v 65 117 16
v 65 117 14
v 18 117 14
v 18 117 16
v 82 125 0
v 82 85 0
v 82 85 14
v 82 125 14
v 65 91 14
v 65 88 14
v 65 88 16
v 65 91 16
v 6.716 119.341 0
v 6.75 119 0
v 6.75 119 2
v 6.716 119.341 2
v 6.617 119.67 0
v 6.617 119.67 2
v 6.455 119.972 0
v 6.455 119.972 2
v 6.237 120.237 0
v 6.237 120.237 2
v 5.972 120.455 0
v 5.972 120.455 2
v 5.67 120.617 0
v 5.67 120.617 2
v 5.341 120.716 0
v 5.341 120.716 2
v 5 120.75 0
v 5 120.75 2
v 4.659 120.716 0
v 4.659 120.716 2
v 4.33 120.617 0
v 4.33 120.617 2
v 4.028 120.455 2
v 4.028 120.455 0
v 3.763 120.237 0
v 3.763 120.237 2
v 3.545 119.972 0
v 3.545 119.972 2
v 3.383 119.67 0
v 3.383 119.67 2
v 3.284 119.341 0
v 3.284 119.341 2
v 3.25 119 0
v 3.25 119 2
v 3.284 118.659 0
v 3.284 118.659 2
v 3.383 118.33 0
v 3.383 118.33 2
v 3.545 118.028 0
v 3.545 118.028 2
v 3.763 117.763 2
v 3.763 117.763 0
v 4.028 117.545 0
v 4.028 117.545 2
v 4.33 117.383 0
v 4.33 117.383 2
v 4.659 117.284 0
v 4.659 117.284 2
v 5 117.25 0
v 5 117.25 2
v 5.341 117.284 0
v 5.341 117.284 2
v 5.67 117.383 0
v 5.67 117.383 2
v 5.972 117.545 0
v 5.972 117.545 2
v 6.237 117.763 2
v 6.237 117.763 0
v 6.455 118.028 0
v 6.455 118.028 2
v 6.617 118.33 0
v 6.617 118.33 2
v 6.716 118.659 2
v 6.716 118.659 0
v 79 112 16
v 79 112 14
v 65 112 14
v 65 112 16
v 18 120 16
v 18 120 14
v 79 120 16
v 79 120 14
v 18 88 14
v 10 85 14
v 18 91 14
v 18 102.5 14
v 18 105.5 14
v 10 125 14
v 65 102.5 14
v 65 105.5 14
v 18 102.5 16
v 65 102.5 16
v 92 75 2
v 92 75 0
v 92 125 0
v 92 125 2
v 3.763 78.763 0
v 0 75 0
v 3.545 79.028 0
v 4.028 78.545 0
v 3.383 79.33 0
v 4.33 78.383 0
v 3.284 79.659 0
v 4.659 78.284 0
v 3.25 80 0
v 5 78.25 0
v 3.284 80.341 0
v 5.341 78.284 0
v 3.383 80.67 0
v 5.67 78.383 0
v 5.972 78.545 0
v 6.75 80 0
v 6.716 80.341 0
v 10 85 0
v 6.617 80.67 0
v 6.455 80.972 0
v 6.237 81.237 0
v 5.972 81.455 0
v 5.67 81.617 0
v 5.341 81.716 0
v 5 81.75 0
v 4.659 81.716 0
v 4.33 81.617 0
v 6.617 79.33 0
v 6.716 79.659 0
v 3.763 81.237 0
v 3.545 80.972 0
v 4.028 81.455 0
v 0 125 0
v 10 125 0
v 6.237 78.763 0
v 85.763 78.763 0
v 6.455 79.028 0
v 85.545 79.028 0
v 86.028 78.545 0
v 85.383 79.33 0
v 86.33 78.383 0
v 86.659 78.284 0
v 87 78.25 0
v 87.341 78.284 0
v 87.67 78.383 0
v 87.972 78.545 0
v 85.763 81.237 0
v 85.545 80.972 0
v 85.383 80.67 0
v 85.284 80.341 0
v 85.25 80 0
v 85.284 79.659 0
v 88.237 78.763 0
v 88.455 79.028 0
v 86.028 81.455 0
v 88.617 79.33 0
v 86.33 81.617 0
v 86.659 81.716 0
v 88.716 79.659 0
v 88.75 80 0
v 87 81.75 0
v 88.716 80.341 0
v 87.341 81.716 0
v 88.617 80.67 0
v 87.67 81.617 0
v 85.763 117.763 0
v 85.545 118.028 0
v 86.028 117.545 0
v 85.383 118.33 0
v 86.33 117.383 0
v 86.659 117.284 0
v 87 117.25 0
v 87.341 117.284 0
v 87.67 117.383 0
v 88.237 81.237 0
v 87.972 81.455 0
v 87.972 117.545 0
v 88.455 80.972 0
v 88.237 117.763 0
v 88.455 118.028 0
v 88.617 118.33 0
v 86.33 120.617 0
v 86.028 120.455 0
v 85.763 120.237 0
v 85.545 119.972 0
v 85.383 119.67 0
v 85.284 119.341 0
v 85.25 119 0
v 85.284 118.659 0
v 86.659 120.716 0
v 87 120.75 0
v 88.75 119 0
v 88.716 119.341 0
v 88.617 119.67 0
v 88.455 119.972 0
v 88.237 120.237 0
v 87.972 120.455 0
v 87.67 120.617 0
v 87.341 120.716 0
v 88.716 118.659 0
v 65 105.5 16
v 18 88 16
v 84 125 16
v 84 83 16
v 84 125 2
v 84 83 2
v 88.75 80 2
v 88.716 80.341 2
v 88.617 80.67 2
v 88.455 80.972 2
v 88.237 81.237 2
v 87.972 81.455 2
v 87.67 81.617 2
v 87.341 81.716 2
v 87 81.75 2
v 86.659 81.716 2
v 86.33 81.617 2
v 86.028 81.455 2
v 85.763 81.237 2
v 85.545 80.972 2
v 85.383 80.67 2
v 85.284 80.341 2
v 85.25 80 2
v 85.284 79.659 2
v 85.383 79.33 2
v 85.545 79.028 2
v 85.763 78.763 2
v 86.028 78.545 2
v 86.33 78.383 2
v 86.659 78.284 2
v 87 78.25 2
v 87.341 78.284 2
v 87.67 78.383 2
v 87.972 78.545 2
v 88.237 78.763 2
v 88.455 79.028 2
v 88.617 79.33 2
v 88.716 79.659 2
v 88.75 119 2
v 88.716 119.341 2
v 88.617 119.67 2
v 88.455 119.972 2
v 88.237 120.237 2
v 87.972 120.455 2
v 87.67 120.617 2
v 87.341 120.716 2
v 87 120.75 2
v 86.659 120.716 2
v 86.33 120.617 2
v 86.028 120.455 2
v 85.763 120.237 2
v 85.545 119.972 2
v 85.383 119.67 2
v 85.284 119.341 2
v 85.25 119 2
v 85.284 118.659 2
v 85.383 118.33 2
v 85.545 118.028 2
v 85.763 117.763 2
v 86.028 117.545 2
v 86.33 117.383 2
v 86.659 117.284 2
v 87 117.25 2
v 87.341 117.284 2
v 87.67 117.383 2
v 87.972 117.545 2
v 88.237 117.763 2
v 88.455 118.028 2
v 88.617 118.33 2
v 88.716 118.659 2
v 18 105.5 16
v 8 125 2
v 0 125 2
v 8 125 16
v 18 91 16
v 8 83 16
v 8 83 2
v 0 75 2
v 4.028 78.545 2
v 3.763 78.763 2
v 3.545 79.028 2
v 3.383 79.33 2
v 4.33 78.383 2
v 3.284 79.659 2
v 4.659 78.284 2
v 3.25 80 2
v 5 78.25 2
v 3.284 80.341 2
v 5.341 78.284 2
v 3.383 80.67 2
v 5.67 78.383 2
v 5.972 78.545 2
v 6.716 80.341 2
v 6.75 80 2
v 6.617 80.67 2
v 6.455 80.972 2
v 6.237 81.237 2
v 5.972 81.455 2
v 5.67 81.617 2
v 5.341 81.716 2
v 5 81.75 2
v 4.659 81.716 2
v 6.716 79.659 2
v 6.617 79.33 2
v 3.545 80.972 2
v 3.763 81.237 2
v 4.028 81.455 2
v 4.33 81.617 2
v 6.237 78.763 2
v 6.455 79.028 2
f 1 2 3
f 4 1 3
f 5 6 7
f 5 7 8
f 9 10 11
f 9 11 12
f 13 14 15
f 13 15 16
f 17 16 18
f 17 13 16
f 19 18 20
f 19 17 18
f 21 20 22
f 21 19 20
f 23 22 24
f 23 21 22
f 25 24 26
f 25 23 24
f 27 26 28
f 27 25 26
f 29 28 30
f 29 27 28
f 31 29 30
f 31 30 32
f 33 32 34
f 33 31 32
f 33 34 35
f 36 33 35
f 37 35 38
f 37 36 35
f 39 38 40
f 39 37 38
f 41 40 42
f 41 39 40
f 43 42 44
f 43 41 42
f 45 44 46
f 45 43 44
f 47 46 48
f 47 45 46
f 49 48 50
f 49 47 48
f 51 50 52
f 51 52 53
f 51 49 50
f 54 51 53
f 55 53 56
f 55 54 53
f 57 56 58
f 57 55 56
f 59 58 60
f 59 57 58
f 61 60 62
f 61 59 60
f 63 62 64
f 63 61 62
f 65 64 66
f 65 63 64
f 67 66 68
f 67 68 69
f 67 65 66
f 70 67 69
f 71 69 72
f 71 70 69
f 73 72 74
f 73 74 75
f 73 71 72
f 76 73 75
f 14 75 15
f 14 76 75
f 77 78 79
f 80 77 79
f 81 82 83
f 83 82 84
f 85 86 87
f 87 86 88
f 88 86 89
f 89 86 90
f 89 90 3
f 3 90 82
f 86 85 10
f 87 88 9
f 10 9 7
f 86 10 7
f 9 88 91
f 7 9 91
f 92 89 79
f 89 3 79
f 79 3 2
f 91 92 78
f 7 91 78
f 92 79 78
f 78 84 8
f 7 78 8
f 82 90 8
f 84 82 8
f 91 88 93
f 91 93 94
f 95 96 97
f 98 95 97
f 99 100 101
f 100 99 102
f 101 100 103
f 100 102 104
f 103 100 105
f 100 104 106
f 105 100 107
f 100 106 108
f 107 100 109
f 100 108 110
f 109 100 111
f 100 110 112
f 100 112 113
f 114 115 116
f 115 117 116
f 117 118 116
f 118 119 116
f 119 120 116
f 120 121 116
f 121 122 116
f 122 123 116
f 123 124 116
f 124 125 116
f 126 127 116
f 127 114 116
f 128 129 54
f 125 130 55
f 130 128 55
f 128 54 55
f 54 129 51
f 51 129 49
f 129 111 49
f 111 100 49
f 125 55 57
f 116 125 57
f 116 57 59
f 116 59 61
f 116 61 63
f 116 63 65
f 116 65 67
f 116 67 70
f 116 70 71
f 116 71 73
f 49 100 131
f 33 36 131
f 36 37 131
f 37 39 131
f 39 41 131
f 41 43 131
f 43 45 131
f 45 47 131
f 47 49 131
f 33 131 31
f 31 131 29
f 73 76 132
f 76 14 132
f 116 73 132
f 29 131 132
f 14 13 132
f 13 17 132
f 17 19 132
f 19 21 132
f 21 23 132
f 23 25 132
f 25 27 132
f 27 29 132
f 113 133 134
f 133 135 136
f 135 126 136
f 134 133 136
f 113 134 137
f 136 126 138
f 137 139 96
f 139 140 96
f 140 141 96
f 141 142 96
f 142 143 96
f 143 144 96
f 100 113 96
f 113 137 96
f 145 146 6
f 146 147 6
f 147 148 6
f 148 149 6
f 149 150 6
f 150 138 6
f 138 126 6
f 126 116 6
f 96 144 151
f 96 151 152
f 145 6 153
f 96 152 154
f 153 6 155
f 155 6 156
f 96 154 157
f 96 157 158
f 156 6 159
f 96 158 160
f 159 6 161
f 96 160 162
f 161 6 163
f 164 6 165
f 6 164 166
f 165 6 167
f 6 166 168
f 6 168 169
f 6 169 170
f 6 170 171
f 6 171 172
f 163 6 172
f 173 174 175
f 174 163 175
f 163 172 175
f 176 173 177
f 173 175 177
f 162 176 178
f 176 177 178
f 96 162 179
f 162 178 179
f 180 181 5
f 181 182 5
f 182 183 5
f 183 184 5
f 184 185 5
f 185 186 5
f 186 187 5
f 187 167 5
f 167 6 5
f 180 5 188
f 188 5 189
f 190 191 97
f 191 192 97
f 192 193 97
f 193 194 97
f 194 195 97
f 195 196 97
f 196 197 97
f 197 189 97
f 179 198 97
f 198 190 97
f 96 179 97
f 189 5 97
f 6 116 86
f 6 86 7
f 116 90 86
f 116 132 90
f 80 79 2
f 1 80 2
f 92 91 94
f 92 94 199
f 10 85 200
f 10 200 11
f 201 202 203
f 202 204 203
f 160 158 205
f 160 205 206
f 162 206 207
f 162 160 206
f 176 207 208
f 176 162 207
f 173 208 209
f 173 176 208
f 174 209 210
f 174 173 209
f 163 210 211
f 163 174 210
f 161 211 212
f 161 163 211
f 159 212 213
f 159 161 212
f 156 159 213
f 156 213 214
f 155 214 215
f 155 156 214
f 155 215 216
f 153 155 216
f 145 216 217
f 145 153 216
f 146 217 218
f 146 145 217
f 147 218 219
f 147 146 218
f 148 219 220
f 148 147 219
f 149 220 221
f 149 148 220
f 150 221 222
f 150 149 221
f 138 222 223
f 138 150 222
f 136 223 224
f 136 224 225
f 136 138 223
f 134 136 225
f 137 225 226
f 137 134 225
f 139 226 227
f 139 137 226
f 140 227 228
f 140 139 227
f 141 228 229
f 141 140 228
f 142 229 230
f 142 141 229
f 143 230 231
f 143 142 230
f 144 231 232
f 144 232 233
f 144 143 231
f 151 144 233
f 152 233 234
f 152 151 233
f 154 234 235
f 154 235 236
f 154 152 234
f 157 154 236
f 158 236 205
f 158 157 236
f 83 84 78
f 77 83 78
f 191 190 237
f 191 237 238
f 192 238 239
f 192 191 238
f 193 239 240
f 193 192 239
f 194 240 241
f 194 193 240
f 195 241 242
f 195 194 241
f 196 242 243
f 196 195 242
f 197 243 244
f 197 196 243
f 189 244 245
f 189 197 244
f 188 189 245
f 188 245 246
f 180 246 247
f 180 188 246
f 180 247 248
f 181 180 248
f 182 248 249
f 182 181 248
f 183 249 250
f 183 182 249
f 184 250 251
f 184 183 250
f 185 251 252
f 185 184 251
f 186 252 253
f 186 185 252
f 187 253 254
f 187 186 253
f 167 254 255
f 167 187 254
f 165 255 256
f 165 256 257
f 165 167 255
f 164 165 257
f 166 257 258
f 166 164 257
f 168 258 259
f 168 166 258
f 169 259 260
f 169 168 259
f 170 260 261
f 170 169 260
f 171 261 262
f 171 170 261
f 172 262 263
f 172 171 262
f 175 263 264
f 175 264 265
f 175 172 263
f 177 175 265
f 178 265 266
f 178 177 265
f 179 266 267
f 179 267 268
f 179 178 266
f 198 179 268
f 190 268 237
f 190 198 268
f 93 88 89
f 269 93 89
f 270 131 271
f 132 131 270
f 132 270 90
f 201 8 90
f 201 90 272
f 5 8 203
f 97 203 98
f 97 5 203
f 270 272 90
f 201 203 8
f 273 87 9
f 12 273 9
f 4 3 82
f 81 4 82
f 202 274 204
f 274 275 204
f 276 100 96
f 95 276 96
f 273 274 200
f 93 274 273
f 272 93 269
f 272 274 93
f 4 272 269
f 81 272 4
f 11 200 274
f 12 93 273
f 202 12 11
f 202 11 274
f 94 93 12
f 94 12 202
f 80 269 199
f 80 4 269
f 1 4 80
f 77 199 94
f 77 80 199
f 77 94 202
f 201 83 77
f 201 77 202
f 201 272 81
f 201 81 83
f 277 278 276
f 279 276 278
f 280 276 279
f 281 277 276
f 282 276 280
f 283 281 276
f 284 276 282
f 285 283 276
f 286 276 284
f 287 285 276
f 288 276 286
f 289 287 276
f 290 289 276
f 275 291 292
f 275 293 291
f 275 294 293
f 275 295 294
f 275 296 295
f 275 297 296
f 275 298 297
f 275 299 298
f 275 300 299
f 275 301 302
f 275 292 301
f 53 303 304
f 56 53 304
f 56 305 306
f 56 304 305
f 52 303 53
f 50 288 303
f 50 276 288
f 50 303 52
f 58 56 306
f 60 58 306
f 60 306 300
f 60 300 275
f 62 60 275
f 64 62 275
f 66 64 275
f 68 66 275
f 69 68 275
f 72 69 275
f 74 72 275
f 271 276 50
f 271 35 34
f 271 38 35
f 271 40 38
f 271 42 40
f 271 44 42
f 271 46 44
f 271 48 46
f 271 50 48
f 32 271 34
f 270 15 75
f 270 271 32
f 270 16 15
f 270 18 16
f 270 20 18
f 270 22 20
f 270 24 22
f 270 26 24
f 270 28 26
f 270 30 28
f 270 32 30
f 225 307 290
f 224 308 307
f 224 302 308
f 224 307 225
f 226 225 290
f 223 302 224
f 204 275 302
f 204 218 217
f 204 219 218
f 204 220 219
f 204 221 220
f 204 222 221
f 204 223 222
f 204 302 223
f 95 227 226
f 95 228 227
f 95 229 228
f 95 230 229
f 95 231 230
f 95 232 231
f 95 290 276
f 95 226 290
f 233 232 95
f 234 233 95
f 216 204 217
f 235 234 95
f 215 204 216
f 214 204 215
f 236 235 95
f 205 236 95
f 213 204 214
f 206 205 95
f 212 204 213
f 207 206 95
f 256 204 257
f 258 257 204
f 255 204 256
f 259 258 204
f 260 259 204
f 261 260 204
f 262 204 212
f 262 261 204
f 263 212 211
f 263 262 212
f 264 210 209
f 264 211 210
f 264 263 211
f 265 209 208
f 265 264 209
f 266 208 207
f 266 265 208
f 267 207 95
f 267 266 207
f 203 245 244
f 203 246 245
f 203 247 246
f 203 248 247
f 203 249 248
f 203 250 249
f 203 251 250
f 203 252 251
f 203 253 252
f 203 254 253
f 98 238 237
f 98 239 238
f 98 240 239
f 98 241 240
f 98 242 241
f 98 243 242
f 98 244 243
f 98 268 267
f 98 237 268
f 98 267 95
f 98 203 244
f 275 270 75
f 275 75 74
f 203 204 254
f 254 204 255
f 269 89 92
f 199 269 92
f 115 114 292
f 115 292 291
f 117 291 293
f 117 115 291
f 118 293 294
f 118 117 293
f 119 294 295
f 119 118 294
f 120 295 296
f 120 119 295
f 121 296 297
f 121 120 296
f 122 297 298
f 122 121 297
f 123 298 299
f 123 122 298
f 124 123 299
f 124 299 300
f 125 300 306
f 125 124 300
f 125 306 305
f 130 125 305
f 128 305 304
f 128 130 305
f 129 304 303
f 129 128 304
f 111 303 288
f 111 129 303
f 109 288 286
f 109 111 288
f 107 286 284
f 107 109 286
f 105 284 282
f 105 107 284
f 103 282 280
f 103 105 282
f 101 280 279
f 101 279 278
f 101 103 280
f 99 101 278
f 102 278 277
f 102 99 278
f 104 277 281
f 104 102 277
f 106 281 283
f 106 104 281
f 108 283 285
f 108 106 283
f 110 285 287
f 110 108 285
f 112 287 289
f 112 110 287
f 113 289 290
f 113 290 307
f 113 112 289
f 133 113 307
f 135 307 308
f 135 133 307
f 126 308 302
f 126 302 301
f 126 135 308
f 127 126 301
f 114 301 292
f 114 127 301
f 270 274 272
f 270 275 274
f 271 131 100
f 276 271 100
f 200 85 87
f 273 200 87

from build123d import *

# Parameters (mm, degrees)
SKETCH031_R   = 1.75
PAD017_DEPTH  = 2
PAD018_DEPTH  = 12
SKETCH033_W   = 76
SKETCH033_H   = 42
SKETCH033_W_2 = 47
SKETCH033_H_2 = 3
PAD019_DEPTH  = 2


with BuildPart() as part:
    # Sketch031 → Pad017 (new body)
    with BuildSketch(Plane.XY):
        Polygon((10, 0), (0, 0), (0, -50), (92, -50), (92, 0), (82, 0), (82, -40), (10, -40), align=None)
        with Locations((5, -45)):
            Circle(SKETCH031_R, mode=Mode.SUBTRACT)
        with Locations((87, -45)):
            Circle(SKETCH031_R, mode=Mode.SUBTRACT)
        with Locations((87, -6)):
            Circle(SKETCH031_R, mode=Mode.SUBTRACT)
        with Locations((5, -6)):
            Circle(SKETCH031_R, mode=Mode.SUBTRACT)
    extrude(amount=PAD017_DEPTH)

    # Sketch032 (on Face14 of Pad017) → Pad018 (join)
    with BuildSketch(Plane.XY.offset(2)):
        Polygon((10, 0), (10, -40), (82, -40), (82, 0), (84, 0), (84, -42), (8, -42), (8, 0), align=None)
    extrude(amount=PAD018_DEPTH)

    # Sketch033 (on Face18 of Pad018) → Pad019 (join)
    with BuildSketch(Plane.XY.offset(14)):
        with Locations((46, -21)):
            Rectangle(SKETCH033_W, SKETCH033_H)
        Polygon((18, -5), (74, -5), (79, -5), (79, -13), (65, -13), (65, -8), (18, -8), align=None, mode=Mode.SUBTRACT)
        with Locations((41.5, -21)):
            Rectangle(SKETCH033_W_2, SKETCH033_H_2, mode=Mode.SUBTRACT)
        with Locations((41.5, -35.5)):
            Rectangle(SKETCH033_W_2, SKETCH033_H_2, mode=Mode.SUBTRACT)
    extrude(amount=PAD019_DEPTH)


with BuildPart() as part_1:
    # Body015 placement: moved
    add(part.part.moved(Location((0, 125, 0))))


solid = part_1.part
